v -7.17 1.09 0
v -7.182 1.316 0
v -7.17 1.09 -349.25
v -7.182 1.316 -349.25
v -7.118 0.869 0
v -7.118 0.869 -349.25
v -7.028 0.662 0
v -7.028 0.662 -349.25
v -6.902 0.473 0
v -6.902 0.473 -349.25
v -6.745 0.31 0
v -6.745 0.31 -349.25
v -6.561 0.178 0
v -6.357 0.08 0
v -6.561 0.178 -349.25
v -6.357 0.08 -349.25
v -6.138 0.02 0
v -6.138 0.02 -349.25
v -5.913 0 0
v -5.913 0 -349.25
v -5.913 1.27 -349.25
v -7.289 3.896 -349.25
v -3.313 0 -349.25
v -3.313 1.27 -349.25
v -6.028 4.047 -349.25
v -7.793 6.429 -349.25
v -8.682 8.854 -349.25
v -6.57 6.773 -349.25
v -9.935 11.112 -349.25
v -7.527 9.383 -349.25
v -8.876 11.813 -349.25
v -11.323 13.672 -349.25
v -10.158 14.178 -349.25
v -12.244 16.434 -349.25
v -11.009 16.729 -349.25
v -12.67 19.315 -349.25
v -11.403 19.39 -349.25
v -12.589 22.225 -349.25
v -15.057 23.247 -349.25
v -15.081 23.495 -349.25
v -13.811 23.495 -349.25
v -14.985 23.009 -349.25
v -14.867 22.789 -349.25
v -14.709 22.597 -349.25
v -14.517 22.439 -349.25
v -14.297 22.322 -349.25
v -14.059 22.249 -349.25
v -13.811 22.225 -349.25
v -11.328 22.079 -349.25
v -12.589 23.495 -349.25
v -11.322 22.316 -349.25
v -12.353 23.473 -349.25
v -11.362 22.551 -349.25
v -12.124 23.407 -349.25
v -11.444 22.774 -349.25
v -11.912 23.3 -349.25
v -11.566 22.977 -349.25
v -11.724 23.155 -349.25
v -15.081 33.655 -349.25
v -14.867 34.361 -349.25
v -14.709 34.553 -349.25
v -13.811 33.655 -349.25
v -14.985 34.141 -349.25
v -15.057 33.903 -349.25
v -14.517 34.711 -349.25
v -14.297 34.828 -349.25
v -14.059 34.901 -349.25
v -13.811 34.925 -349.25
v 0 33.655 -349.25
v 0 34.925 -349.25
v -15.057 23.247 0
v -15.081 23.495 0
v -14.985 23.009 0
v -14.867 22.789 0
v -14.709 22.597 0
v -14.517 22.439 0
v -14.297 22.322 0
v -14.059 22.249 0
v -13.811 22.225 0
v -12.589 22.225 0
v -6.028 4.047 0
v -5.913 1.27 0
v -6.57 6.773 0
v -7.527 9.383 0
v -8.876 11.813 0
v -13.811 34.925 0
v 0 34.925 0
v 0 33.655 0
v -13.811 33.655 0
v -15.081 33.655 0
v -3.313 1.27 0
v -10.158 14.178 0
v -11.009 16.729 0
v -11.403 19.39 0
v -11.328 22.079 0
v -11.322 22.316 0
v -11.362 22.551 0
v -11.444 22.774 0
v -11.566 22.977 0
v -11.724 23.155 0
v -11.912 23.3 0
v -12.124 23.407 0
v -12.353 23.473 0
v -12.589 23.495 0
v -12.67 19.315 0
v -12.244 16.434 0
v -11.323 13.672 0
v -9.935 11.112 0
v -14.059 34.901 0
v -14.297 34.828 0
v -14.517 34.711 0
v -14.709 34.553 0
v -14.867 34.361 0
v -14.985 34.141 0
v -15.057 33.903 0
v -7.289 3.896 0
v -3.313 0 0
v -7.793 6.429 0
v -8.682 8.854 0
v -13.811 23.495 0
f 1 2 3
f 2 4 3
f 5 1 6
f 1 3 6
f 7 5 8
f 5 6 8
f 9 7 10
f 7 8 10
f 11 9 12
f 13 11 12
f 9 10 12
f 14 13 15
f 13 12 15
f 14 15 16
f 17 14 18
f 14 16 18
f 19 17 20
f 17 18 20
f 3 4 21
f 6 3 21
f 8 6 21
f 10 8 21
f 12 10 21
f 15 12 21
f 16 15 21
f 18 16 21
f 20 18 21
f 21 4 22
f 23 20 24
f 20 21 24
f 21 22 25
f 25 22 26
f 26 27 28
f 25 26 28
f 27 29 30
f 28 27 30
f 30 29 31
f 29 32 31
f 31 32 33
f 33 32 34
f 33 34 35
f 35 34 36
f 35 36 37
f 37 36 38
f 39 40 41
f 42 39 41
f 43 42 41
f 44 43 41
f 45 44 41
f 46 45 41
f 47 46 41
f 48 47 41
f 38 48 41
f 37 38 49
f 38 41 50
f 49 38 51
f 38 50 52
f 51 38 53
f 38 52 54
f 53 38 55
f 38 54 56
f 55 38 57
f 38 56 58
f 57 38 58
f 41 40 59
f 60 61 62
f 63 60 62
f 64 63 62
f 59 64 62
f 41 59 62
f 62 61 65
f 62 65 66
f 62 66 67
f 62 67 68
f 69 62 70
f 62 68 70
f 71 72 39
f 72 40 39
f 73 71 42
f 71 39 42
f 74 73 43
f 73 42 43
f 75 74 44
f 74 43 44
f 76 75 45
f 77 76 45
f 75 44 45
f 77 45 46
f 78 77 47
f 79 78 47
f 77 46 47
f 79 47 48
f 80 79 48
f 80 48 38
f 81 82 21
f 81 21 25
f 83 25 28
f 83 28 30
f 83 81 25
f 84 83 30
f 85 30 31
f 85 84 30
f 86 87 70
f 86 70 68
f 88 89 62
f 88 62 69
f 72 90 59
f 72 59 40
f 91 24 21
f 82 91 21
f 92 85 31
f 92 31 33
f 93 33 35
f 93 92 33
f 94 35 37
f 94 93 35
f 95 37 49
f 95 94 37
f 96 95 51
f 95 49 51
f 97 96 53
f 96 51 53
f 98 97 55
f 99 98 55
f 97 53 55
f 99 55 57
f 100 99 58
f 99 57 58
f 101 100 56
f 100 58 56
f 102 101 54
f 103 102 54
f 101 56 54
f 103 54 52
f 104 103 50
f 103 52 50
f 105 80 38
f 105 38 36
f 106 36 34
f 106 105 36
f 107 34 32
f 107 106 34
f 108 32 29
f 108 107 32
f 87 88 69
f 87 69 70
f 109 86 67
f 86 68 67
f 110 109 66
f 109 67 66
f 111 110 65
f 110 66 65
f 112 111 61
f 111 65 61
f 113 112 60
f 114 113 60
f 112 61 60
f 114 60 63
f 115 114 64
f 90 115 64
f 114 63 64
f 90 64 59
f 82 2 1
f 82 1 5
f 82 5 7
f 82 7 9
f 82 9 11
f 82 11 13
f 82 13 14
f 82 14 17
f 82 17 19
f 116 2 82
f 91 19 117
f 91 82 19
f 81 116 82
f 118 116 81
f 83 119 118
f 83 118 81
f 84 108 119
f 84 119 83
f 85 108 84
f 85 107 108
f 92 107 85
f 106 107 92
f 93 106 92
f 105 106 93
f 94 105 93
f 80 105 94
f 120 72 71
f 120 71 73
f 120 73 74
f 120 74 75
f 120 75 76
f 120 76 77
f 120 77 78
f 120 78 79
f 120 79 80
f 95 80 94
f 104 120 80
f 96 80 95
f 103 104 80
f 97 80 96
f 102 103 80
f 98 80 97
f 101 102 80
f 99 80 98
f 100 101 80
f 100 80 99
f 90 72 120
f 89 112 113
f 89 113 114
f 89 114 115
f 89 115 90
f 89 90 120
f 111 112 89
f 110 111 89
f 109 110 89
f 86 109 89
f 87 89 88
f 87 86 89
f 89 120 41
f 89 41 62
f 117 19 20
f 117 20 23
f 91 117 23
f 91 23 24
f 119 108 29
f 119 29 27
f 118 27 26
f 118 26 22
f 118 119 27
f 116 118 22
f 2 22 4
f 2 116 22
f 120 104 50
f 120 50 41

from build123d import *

# Parameters (mm, degrees)
EXTRUDE_THIN1_DEPTH = 349.25
FILLET1_R           = 1.27


with BuildPart() as part:
    # Sketch1 → Extrude-Thin1 (new body)
    with BuildSketch(Plane.XY):
        with BuildLine():
            Line((0, 34.925), (-15.08125, 34.925))
            Line((-15.08125, 34.925), (-15.08125, 22.225))
            Line((-15.08125, 22.225), (-12.589163559, 22.225))
            ThreePointArc((-12.589163559, 22.225), (-12.244128802, 16.434292536), (-9.935478518, 11.1125))
            ThreePointArc((-9.935478518, 11.1125), (-7.626828235, 5.790707464), (-7.281793478, 0))
            Line((-7.281793478, 0), (-3.313043478, 0))
            Line((-3.313043478, 0), (-3.313043478, 1.27))
            Line((-3.313043478, 1.27), (-5.912702406, 1.27))
            ThreePointArc((-5.912702406, 1.27), (-6.570184472, 6.773148448), (-8.876108727, 11.812953884))
            ThreePointArc((-8.876108727, 11.812953884), (-11.159248724, 17.431038769), (-11.096159817, 23.495))
            Line((-11.096159817, 23.495), (-13.81125, 23.495))
            Line((-13.81125, 23.495), (-13.81125, 33.655))
            Line((-13.81125, 33.655), (0, 33.655))
            Line((0, 33.655), (0, 34.925))
        make_face()
    extrude(amount=-EXTRUDE_THIN1_DEPTH)

    # Fillet1
    fillet1_edges = [part.edges().sort_by_distance(p)[0] for p in [
        (-7.281793478, 0, -174.625),
        (-15.08125, 22.225, -174.625),
        (-15.08125, 34.925, -174.625),
        (-11.096159817, 23.495, -174.625),
    ]]
    fillet(fillet1_edges, radius=FILLET1_R)


solid = part.part
